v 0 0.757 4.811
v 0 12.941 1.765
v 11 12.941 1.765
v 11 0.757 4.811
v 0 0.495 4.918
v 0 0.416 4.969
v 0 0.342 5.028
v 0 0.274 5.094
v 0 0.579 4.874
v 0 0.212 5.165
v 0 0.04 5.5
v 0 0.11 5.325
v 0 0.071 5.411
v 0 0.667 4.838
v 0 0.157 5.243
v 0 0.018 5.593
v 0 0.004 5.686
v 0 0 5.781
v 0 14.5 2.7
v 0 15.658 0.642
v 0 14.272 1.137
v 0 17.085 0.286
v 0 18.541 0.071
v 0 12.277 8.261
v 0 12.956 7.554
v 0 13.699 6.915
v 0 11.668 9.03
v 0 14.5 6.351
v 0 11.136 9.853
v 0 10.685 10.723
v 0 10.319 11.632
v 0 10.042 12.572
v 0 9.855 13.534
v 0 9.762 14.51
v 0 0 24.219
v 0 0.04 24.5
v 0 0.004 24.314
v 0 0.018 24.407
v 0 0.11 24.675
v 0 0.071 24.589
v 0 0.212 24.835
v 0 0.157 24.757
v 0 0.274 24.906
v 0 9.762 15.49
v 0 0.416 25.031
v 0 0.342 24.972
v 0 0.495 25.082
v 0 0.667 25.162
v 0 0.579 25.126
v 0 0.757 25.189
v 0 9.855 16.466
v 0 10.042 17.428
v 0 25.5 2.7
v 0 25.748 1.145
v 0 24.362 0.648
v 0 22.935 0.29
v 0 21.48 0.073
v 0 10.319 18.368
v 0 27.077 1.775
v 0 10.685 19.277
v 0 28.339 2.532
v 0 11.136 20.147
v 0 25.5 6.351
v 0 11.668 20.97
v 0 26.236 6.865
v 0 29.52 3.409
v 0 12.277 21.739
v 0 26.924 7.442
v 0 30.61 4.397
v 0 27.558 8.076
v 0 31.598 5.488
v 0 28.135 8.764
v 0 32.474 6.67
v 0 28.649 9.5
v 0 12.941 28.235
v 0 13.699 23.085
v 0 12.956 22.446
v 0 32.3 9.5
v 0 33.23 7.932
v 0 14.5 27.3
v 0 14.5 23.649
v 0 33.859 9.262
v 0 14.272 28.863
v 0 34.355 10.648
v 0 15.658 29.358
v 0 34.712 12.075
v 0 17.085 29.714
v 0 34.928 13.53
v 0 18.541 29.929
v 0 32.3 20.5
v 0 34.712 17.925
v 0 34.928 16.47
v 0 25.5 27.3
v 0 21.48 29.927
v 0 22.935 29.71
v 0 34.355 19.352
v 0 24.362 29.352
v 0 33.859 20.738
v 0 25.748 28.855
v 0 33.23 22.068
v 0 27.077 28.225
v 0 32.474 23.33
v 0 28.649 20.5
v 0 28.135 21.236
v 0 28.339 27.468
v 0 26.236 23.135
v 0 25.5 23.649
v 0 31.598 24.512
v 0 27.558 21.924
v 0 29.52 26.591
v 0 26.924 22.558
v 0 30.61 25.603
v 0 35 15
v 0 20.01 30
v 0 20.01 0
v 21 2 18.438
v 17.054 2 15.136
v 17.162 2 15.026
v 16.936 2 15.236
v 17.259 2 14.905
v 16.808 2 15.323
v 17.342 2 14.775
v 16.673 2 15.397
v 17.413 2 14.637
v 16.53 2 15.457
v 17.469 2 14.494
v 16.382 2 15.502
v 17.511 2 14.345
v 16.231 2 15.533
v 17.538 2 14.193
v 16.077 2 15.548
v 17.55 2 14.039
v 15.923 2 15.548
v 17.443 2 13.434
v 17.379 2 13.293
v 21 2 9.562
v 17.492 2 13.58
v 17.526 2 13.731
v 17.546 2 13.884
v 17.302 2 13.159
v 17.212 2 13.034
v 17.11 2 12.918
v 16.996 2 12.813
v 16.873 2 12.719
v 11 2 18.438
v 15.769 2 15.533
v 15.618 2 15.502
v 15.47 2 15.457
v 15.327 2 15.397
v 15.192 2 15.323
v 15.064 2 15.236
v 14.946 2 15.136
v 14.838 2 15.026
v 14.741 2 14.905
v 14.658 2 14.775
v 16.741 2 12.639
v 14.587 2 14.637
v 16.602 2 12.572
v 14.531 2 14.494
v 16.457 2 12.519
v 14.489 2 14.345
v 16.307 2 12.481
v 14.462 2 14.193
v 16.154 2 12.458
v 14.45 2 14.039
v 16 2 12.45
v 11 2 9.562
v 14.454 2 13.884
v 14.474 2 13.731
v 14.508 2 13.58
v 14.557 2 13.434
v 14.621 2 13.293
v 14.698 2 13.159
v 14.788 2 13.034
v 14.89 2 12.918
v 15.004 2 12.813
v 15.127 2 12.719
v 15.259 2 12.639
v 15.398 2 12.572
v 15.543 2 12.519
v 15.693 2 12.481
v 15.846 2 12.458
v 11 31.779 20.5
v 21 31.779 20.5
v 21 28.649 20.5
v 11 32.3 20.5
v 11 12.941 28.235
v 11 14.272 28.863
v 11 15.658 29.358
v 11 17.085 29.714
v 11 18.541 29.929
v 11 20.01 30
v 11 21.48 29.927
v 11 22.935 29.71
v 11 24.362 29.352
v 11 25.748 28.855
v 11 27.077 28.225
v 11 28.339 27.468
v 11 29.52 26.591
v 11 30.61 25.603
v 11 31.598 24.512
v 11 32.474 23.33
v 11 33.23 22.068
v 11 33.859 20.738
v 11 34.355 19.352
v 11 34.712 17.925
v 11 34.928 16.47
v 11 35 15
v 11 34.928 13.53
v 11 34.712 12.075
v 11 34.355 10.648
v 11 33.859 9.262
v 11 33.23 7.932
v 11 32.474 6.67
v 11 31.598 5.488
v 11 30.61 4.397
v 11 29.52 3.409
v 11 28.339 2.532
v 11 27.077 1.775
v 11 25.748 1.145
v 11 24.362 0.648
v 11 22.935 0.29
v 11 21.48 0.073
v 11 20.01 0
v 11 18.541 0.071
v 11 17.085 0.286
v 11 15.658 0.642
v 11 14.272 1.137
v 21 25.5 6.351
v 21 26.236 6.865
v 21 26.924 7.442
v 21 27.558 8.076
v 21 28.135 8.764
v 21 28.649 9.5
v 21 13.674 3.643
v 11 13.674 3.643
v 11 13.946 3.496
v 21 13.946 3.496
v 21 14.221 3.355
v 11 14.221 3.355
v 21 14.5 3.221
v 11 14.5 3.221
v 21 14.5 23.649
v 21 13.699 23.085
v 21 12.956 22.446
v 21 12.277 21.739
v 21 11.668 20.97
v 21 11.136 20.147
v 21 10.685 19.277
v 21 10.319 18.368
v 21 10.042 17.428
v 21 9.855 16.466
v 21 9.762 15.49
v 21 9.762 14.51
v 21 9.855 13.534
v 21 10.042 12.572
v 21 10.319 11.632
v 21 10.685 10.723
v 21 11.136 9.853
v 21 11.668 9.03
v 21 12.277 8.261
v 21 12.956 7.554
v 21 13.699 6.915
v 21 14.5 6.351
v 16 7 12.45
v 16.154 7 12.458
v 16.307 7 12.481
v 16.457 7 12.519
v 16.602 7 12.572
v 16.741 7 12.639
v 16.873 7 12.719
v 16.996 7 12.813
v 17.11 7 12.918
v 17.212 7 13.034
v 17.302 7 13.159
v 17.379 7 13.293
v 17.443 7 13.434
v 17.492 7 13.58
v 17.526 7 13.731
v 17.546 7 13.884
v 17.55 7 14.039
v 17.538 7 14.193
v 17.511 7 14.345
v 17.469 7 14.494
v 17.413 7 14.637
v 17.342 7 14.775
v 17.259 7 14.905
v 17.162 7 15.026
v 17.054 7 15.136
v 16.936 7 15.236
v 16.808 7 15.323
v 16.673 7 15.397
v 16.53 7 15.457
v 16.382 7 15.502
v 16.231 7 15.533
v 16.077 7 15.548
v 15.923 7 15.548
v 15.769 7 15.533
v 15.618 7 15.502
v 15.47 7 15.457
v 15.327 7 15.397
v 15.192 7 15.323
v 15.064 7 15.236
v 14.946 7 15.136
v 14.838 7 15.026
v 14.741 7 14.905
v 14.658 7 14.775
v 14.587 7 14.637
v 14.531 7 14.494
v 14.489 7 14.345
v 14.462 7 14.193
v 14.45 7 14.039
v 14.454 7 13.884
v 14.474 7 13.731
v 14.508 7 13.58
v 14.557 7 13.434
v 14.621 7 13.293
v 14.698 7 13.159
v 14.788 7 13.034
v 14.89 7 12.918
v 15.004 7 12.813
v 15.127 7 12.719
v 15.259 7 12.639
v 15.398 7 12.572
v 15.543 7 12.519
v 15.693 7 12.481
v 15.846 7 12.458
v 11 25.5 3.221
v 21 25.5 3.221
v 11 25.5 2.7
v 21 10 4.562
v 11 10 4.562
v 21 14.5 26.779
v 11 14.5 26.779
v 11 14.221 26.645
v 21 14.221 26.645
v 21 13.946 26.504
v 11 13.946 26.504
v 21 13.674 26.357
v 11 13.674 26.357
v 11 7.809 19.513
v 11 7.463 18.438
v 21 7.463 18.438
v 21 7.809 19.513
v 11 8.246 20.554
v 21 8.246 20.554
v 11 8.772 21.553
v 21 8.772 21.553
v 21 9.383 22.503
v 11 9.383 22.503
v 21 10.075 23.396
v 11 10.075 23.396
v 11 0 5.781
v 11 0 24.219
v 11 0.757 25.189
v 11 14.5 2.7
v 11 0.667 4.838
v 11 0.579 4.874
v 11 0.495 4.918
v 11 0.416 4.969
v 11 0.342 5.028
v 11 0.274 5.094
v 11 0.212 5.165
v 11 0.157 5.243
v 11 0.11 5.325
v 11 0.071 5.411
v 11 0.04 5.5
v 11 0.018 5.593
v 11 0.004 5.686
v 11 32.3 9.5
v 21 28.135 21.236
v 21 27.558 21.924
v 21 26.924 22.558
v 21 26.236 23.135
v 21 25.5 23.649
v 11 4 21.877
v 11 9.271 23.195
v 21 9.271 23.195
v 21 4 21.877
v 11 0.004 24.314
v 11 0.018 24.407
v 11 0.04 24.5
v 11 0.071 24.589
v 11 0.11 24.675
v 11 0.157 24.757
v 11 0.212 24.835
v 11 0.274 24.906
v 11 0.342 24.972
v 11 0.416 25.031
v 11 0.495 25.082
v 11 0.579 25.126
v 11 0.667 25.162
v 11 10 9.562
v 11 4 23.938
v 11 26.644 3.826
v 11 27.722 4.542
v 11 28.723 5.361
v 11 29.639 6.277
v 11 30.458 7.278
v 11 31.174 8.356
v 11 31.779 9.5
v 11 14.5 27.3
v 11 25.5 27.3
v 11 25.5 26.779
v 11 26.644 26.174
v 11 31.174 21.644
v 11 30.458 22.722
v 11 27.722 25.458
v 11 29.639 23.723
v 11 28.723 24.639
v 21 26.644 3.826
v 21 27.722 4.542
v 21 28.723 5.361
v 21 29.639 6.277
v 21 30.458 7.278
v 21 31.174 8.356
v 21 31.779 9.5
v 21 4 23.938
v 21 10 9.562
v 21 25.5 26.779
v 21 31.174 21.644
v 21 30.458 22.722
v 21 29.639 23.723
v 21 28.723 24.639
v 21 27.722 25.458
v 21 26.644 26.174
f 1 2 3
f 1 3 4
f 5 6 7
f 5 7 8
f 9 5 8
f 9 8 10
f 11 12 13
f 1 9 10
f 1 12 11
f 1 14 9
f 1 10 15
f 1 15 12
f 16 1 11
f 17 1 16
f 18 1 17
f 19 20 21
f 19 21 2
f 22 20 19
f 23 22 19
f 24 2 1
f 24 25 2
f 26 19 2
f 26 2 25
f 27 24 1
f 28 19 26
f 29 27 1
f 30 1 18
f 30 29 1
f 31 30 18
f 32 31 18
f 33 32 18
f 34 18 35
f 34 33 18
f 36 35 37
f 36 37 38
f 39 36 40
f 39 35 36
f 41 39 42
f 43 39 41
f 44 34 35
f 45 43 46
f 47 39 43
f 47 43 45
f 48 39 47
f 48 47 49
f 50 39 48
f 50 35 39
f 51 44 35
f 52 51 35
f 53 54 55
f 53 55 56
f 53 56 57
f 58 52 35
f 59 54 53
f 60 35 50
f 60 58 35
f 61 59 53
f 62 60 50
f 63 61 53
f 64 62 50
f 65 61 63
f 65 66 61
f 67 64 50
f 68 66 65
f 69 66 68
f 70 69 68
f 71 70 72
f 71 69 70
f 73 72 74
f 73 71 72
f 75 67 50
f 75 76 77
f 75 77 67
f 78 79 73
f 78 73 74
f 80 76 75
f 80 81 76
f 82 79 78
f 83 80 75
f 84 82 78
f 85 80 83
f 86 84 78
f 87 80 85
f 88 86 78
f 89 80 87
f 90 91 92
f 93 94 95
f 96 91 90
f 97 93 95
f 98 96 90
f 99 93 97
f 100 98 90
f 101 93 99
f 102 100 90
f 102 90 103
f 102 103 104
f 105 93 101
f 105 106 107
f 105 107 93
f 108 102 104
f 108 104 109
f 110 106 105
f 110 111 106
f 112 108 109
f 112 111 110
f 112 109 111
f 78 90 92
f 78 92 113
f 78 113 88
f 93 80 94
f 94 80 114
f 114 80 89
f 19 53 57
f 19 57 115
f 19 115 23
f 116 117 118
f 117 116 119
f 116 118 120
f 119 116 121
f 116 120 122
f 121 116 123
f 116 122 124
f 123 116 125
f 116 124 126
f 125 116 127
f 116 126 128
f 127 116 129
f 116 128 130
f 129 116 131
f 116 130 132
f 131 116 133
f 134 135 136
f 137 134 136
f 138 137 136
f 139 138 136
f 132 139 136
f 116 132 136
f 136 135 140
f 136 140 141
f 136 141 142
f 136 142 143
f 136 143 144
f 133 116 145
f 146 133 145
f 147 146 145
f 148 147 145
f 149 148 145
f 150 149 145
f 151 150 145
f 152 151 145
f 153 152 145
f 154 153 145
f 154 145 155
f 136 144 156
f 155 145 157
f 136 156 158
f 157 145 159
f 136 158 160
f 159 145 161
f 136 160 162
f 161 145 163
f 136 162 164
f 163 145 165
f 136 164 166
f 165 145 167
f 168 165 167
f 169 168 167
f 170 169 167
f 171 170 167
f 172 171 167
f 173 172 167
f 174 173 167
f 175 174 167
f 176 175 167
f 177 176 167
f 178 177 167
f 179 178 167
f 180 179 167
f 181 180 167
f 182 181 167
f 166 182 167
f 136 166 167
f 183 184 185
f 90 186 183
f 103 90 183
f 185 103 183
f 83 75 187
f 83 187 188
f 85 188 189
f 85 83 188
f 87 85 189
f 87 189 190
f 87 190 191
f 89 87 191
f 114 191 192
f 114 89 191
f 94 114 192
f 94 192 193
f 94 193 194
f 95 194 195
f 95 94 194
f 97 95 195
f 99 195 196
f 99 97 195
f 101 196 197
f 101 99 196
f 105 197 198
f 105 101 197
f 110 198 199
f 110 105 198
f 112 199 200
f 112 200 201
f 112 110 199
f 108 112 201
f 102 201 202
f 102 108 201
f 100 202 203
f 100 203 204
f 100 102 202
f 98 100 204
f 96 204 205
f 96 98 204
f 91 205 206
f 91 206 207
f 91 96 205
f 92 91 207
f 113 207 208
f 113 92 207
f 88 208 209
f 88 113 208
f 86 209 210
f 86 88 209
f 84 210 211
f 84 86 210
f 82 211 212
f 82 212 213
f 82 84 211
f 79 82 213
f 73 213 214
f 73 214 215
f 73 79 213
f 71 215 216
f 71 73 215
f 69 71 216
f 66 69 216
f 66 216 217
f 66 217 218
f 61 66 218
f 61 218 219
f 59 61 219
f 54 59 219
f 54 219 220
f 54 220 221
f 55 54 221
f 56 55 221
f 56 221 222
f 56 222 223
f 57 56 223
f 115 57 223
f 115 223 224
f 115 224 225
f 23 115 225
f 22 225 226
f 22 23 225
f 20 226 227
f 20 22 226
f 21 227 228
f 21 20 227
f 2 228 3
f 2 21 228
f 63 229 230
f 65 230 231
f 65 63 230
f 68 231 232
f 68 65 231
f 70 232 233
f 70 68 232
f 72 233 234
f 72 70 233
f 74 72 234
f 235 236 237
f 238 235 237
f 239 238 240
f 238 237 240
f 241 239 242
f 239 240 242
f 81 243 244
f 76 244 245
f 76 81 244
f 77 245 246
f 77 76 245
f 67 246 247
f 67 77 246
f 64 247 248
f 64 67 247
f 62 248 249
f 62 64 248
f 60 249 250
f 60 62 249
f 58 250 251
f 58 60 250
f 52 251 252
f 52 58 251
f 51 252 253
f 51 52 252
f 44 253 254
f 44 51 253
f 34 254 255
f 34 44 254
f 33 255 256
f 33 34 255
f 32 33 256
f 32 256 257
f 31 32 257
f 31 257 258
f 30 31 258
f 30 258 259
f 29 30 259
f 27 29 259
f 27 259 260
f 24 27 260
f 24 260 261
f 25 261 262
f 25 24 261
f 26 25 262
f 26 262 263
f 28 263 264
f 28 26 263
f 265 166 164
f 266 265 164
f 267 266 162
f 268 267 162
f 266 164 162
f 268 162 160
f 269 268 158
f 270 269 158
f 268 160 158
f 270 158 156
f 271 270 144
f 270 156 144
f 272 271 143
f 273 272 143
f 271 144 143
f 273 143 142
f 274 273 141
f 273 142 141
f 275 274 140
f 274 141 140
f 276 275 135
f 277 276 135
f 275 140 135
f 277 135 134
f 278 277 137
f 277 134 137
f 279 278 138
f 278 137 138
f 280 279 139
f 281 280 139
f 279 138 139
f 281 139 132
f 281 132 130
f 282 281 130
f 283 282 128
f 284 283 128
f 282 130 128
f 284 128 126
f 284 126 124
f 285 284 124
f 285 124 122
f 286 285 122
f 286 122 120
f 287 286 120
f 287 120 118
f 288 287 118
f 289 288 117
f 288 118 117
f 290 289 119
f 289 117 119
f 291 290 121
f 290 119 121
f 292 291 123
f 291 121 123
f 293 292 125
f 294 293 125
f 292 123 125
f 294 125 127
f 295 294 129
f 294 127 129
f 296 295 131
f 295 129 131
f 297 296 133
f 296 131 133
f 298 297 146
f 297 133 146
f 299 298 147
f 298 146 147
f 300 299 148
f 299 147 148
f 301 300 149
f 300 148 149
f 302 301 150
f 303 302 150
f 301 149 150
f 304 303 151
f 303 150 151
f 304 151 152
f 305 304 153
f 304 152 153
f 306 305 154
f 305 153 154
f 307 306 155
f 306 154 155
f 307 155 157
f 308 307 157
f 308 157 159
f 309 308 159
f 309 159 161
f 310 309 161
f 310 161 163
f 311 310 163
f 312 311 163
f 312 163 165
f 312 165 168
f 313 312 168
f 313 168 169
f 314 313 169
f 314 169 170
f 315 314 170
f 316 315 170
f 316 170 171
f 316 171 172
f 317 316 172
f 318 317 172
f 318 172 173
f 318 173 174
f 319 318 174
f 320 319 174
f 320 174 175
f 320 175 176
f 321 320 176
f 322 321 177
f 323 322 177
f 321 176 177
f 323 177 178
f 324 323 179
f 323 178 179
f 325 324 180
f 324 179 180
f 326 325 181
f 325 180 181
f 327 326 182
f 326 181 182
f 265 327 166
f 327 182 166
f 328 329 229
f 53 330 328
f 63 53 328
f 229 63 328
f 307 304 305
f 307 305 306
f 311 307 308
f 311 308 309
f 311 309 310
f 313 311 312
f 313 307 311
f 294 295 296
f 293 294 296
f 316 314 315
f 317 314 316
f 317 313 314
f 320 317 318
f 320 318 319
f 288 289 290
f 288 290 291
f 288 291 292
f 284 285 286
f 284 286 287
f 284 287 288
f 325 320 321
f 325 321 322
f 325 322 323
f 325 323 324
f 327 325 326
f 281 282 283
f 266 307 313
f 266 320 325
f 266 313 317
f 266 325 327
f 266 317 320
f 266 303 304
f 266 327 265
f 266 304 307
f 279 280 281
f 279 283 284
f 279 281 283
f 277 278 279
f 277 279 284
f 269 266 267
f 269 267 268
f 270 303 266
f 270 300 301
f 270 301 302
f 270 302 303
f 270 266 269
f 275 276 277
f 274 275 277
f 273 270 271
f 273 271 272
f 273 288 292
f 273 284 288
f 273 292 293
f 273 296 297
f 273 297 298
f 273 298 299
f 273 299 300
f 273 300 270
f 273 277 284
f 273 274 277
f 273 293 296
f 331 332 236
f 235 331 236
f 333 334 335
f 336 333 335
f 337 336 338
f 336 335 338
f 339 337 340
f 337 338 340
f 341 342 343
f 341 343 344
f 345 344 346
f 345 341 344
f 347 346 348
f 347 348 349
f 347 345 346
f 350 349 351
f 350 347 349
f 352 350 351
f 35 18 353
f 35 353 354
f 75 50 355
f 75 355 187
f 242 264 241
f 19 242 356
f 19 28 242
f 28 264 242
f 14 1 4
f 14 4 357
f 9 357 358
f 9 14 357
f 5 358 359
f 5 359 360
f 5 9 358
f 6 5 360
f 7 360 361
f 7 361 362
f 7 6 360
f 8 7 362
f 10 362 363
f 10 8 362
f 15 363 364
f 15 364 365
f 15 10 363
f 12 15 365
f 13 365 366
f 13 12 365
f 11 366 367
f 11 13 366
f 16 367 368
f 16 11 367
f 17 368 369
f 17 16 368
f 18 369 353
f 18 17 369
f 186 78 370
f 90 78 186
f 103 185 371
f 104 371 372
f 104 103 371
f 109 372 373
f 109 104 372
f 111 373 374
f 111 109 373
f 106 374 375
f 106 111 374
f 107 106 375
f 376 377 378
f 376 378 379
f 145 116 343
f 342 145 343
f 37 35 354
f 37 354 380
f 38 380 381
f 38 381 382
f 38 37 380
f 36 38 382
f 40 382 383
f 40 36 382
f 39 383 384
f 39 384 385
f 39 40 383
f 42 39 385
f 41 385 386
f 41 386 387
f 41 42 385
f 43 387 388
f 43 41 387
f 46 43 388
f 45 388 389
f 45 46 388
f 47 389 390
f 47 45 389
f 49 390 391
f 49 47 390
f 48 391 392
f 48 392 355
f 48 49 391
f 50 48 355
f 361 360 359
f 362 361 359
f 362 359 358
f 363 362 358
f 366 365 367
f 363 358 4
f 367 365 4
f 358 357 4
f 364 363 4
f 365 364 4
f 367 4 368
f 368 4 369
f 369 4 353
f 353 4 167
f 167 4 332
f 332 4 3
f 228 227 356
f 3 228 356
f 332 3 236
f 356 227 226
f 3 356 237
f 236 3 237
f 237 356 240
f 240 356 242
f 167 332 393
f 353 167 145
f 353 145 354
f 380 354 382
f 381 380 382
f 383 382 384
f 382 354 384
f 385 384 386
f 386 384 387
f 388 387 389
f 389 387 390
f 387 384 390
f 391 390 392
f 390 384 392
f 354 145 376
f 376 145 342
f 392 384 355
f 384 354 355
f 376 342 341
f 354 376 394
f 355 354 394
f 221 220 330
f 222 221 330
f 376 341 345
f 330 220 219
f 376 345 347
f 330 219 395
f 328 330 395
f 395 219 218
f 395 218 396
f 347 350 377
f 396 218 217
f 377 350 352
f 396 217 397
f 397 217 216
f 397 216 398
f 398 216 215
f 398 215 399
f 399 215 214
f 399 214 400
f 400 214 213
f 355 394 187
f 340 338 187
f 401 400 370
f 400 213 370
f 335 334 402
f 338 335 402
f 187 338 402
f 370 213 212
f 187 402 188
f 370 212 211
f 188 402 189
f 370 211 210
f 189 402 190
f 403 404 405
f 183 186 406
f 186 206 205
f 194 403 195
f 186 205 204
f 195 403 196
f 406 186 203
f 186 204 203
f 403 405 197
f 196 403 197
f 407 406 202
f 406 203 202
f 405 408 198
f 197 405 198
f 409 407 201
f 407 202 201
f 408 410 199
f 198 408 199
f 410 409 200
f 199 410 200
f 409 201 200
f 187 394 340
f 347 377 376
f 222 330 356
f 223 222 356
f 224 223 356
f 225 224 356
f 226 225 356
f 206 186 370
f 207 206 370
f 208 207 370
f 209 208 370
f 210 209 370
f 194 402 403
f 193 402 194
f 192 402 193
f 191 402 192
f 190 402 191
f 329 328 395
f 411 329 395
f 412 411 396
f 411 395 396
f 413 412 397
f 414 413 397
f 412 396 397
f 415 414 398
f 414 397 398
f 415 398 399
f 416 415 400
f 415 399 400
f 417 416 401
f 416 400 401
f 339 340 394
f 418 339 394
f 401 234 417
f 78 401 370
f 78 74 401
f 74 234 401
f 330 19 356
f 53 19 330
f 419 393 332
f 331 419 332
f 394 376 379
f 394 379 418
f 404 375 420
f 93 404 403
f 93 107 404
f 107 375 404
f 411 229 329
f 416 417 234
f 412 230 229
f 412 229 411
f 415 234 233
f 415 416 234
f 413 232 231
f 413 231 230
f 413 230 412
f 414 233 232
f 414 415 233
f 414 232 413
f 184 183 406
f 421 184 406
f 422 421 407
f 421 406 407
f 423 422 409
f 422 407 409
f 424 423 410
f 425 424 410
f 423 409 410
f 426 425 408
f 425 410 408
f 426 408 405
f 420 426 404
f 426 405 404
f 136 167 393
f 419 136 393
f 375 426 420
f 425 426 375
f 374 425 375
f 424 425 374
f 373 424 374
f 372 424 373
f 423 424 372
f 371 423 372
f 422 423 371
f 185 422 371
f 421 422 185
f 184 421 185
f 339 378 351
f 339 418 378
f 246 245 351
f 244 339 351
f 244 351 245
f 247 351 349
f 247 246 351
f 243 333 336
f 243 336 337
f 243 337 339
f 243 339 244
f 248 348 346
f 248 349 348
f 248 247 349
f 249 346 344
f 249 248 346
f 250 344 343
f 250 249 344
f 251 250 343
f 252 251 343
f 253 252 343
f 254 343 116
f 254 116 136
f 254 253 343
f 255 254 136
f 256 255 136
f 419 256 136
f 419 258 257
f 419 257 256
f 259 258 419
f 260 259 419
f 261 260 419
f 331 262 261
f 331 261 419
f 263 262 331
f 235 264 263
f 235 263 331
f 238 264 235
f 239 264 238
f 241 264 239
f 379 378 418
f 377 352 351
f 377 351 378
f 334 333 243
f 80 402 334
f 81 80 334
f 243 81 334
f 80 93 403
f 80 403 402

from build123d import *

# Parameters (mm, degrees)
CROQUIS1_R              = 10
SALIENTE_EXTRUIR1_DEPTH = 11
CROQUIS2_R              = 10
SALIENTE_EXTRUIR2_DEPTH = 10
CORTAR_EXTRUIR3_START   = -10
CORTAR_EXTRUIR3_DEPTH   = 10
CROQUIS8_R              = 1.55
CORTAR_EXTRUIR4_DEPTH   = 5
CORTAR_EXTRUIR8_REACH   = 52.656
CORTAR_EXTRUIR9_START   = -10
CORTAR_EXTRUIR9_DEPTH   = 10


with BuildPart() as part:
    # Croquis1 → Saliente-Extruir1 (new body)
    with BuildSketch(Plane(origin=(0, 0, 0), x_dir=(0, 0, -1), z_dir=(1, 0, 0))):
        with BuildLine():
            Line((-5.780776406, 0), (-24.219223594, 0))
            ThreePointArc((-24.219223594, 0), (-24.834635803, 0.211794562), (-25.189366094, 0.757464375))
            Line((-25.189366094, 0.757464375), (-28.235294118, 12.941176471))
            ThreePointArc((-28.235294118, 12.941176471), (-15, 35), (-1.764705882, 12.941176471))
            Line((-1.764705882, 12.941176471), (-4.810633906, 0.757464375))
            ThreePointArc((-4.810633906, 0.757464375), (-5.165364197, 0.211794562), (-5.780776406, 0))
        make_face()
        with Locations((-15, 20)):
            Circle(CROQUIS1_R, mode=Mode.SUBTRACT)
    extrude(amount=SALIENTE_EXTRUIR1_DEPTH)

    # Croquis2 → Saliente-Extruir2 (add)
    with BuildSketch(Plane(origin=(11, 0, 0), x_dir=(0, 0, -1), z_dir=(1, 0, 0))):
        with BuildLine():
            Line((-23.438447187, 2), (-6.561552813, 2))
            Line((-6.561552813, 2), (-3.643105675, 13.673788552))
            ThreePointArc((-3.643105675, 13.673788552), (-15, 33), (-26.356894325, 13.673788552))
            Line((-26.356894325, 13.673788552), (-23.438447187, 2))
        make_face()
        with Locations((-15, 20)):
            Circle(CROQUIS2_R, mode=Mode.SUBTRACT)
    extrude(amount=SALIENTE_EXTRUIR2_DEPTH)

    # Croquis3 → Cortar-Extruir3 (cut)
    with BuildSketch(Plane(origin=(21, 0, 0), x_dir=(0, 0, -1), z_dir=(1, 0, 0)).offset(CORTAR_EXTRUIR3_START)):
        Polygon((-9.561552813, 2), (-9.561552813, 10), (-4.561552813, 10), (-6.561552813, 2), align=None)
        with BuildLine():
            Line((-23.438447187, 2), (-18.438447187, 2))
            Line((-18.438447187, 2), (-18.438447187, 6.945227656))
            Line((-18.438447187, 6.945227656), (-18.438447187, 7.462971606))
            ThreePointArc((-18.438447187, 7.462971606), (-21.059353424, 8.498511571), (-23.395524099, 10.074518898))
            Line((-23.395524099, 10.074518898), (-23.194590952, 9.270786312))
            Line((-23.194590952, 9.270786312), (-21.876894374, 4))
            Line((-21.876894374, 4), (-23.938447187, 4))
            Line((-23.938447187, 4), (-23.438447187, 2))
        make_face()
    extrude(amount=CORTAR_EXTRUIR3_DEPTH, mode=Mode.SUBTRACT)

    # Croquis8 → Cortar-Extruir4 (cut)
    with BuildSketch(Plane.XZ.offset(-2)):
        with Locations(Location((16, 14, 0), (0, 0, 270))):
            Circle(CROQUIS8_R)
    extrude(amount=-CORTAR_EXTRUIR4_DEPTH, mode=Mode.SUBTRACT)

    # Croquis10 → Cortar-Extruir8 (cut, up to next)
    with BuildSketch(Plane.ZY, mode=Mode.PRIVATE) as cortar_extruir8_sk1:
        with BuildLine():
            Line((15, 32.3), (20.5, 32.3))
            Line((20.5, 32.3), (20.5, 28.649421946))
            ThreePointArc((20.5, 28.649421946), (22.247844507, 27.247844507), (23.649421946, 25.5))
            Line((23.649421946, 25.5), (27.3, 25.5))
            Line((27.3, 25.5), (27.3, 20))
            Line((27.3, 20), (27.3, 14.5))
            Line((27.3, 14.5), (23.649421946, 14.5))
            ThreePointArc((23.649421946, 14.5), (15, 9.75), (6.350578054, 14.5))
            Line((6.350578054, 14.5), (2.7, 14.5))
            Line((2.7, 14.5), (2.7, 20))
            Line((2.7, 20), (2.7, 25.5))
            Line((2.7, 25.5), (6.350578054, 25.5))
            ThreePointArc((6.350578054, 25.5), (7.752155493, 27.247844507), (9.5, 28.649421946))
            Line((9.5, 28.649421946), (9.5, 32.3))
            Line((9.5, 32.3), (15, 32.3))
        make_face()
    cortar_extruir8_tool1 = extrude(cortar_extruir8_sk1.sketch, amount=-CORTAR_EXTRUIR8_REACH, mode=Mode.PRIVATE) & part.part
    add(cortar_extruir8_tool1.solids().sort_by_distance((0, 20.746773, 15))[0], mode=Mode.SUBTRACT)

    # Croquis12 → Cortar-Extruir9 (cut)
    with BuildSketch(Plane(origin=(21, 0, 0), x_dir=(0, 0, -1), z_dir=(1, 0, 0)).offset(CORTAR_EXTRUIR9_START)):
        with BuildLine():
            Line((-19.208325083, 32.3), (-10.791674918, 32.3))
            ThreePointArc((-10.791674918, 32.3), (-15, 33), (-19.208325083, 32.3))
        make_face()
        with BuildLine():
            Line((-27.3, 15.791674917), (-27.3, 24.208325082))
            ThreePointArc((-27.3, 24.208325082), (-28, 20), (-27.3, 15.791674917))
        make_face()
        with BuildLine():
            Line((-2.7, 24.208325083), (-2.7, 15.791674917))
            ThreePointArc((-2.7, 15.791674917), (-2, 20), (-2.7, 24.208325083))
        make_face()
    extrude(amount=CORTAR_EXTRUIR9_DEPTH, mode=Mode.SUBTRACT)


solid = part.part
